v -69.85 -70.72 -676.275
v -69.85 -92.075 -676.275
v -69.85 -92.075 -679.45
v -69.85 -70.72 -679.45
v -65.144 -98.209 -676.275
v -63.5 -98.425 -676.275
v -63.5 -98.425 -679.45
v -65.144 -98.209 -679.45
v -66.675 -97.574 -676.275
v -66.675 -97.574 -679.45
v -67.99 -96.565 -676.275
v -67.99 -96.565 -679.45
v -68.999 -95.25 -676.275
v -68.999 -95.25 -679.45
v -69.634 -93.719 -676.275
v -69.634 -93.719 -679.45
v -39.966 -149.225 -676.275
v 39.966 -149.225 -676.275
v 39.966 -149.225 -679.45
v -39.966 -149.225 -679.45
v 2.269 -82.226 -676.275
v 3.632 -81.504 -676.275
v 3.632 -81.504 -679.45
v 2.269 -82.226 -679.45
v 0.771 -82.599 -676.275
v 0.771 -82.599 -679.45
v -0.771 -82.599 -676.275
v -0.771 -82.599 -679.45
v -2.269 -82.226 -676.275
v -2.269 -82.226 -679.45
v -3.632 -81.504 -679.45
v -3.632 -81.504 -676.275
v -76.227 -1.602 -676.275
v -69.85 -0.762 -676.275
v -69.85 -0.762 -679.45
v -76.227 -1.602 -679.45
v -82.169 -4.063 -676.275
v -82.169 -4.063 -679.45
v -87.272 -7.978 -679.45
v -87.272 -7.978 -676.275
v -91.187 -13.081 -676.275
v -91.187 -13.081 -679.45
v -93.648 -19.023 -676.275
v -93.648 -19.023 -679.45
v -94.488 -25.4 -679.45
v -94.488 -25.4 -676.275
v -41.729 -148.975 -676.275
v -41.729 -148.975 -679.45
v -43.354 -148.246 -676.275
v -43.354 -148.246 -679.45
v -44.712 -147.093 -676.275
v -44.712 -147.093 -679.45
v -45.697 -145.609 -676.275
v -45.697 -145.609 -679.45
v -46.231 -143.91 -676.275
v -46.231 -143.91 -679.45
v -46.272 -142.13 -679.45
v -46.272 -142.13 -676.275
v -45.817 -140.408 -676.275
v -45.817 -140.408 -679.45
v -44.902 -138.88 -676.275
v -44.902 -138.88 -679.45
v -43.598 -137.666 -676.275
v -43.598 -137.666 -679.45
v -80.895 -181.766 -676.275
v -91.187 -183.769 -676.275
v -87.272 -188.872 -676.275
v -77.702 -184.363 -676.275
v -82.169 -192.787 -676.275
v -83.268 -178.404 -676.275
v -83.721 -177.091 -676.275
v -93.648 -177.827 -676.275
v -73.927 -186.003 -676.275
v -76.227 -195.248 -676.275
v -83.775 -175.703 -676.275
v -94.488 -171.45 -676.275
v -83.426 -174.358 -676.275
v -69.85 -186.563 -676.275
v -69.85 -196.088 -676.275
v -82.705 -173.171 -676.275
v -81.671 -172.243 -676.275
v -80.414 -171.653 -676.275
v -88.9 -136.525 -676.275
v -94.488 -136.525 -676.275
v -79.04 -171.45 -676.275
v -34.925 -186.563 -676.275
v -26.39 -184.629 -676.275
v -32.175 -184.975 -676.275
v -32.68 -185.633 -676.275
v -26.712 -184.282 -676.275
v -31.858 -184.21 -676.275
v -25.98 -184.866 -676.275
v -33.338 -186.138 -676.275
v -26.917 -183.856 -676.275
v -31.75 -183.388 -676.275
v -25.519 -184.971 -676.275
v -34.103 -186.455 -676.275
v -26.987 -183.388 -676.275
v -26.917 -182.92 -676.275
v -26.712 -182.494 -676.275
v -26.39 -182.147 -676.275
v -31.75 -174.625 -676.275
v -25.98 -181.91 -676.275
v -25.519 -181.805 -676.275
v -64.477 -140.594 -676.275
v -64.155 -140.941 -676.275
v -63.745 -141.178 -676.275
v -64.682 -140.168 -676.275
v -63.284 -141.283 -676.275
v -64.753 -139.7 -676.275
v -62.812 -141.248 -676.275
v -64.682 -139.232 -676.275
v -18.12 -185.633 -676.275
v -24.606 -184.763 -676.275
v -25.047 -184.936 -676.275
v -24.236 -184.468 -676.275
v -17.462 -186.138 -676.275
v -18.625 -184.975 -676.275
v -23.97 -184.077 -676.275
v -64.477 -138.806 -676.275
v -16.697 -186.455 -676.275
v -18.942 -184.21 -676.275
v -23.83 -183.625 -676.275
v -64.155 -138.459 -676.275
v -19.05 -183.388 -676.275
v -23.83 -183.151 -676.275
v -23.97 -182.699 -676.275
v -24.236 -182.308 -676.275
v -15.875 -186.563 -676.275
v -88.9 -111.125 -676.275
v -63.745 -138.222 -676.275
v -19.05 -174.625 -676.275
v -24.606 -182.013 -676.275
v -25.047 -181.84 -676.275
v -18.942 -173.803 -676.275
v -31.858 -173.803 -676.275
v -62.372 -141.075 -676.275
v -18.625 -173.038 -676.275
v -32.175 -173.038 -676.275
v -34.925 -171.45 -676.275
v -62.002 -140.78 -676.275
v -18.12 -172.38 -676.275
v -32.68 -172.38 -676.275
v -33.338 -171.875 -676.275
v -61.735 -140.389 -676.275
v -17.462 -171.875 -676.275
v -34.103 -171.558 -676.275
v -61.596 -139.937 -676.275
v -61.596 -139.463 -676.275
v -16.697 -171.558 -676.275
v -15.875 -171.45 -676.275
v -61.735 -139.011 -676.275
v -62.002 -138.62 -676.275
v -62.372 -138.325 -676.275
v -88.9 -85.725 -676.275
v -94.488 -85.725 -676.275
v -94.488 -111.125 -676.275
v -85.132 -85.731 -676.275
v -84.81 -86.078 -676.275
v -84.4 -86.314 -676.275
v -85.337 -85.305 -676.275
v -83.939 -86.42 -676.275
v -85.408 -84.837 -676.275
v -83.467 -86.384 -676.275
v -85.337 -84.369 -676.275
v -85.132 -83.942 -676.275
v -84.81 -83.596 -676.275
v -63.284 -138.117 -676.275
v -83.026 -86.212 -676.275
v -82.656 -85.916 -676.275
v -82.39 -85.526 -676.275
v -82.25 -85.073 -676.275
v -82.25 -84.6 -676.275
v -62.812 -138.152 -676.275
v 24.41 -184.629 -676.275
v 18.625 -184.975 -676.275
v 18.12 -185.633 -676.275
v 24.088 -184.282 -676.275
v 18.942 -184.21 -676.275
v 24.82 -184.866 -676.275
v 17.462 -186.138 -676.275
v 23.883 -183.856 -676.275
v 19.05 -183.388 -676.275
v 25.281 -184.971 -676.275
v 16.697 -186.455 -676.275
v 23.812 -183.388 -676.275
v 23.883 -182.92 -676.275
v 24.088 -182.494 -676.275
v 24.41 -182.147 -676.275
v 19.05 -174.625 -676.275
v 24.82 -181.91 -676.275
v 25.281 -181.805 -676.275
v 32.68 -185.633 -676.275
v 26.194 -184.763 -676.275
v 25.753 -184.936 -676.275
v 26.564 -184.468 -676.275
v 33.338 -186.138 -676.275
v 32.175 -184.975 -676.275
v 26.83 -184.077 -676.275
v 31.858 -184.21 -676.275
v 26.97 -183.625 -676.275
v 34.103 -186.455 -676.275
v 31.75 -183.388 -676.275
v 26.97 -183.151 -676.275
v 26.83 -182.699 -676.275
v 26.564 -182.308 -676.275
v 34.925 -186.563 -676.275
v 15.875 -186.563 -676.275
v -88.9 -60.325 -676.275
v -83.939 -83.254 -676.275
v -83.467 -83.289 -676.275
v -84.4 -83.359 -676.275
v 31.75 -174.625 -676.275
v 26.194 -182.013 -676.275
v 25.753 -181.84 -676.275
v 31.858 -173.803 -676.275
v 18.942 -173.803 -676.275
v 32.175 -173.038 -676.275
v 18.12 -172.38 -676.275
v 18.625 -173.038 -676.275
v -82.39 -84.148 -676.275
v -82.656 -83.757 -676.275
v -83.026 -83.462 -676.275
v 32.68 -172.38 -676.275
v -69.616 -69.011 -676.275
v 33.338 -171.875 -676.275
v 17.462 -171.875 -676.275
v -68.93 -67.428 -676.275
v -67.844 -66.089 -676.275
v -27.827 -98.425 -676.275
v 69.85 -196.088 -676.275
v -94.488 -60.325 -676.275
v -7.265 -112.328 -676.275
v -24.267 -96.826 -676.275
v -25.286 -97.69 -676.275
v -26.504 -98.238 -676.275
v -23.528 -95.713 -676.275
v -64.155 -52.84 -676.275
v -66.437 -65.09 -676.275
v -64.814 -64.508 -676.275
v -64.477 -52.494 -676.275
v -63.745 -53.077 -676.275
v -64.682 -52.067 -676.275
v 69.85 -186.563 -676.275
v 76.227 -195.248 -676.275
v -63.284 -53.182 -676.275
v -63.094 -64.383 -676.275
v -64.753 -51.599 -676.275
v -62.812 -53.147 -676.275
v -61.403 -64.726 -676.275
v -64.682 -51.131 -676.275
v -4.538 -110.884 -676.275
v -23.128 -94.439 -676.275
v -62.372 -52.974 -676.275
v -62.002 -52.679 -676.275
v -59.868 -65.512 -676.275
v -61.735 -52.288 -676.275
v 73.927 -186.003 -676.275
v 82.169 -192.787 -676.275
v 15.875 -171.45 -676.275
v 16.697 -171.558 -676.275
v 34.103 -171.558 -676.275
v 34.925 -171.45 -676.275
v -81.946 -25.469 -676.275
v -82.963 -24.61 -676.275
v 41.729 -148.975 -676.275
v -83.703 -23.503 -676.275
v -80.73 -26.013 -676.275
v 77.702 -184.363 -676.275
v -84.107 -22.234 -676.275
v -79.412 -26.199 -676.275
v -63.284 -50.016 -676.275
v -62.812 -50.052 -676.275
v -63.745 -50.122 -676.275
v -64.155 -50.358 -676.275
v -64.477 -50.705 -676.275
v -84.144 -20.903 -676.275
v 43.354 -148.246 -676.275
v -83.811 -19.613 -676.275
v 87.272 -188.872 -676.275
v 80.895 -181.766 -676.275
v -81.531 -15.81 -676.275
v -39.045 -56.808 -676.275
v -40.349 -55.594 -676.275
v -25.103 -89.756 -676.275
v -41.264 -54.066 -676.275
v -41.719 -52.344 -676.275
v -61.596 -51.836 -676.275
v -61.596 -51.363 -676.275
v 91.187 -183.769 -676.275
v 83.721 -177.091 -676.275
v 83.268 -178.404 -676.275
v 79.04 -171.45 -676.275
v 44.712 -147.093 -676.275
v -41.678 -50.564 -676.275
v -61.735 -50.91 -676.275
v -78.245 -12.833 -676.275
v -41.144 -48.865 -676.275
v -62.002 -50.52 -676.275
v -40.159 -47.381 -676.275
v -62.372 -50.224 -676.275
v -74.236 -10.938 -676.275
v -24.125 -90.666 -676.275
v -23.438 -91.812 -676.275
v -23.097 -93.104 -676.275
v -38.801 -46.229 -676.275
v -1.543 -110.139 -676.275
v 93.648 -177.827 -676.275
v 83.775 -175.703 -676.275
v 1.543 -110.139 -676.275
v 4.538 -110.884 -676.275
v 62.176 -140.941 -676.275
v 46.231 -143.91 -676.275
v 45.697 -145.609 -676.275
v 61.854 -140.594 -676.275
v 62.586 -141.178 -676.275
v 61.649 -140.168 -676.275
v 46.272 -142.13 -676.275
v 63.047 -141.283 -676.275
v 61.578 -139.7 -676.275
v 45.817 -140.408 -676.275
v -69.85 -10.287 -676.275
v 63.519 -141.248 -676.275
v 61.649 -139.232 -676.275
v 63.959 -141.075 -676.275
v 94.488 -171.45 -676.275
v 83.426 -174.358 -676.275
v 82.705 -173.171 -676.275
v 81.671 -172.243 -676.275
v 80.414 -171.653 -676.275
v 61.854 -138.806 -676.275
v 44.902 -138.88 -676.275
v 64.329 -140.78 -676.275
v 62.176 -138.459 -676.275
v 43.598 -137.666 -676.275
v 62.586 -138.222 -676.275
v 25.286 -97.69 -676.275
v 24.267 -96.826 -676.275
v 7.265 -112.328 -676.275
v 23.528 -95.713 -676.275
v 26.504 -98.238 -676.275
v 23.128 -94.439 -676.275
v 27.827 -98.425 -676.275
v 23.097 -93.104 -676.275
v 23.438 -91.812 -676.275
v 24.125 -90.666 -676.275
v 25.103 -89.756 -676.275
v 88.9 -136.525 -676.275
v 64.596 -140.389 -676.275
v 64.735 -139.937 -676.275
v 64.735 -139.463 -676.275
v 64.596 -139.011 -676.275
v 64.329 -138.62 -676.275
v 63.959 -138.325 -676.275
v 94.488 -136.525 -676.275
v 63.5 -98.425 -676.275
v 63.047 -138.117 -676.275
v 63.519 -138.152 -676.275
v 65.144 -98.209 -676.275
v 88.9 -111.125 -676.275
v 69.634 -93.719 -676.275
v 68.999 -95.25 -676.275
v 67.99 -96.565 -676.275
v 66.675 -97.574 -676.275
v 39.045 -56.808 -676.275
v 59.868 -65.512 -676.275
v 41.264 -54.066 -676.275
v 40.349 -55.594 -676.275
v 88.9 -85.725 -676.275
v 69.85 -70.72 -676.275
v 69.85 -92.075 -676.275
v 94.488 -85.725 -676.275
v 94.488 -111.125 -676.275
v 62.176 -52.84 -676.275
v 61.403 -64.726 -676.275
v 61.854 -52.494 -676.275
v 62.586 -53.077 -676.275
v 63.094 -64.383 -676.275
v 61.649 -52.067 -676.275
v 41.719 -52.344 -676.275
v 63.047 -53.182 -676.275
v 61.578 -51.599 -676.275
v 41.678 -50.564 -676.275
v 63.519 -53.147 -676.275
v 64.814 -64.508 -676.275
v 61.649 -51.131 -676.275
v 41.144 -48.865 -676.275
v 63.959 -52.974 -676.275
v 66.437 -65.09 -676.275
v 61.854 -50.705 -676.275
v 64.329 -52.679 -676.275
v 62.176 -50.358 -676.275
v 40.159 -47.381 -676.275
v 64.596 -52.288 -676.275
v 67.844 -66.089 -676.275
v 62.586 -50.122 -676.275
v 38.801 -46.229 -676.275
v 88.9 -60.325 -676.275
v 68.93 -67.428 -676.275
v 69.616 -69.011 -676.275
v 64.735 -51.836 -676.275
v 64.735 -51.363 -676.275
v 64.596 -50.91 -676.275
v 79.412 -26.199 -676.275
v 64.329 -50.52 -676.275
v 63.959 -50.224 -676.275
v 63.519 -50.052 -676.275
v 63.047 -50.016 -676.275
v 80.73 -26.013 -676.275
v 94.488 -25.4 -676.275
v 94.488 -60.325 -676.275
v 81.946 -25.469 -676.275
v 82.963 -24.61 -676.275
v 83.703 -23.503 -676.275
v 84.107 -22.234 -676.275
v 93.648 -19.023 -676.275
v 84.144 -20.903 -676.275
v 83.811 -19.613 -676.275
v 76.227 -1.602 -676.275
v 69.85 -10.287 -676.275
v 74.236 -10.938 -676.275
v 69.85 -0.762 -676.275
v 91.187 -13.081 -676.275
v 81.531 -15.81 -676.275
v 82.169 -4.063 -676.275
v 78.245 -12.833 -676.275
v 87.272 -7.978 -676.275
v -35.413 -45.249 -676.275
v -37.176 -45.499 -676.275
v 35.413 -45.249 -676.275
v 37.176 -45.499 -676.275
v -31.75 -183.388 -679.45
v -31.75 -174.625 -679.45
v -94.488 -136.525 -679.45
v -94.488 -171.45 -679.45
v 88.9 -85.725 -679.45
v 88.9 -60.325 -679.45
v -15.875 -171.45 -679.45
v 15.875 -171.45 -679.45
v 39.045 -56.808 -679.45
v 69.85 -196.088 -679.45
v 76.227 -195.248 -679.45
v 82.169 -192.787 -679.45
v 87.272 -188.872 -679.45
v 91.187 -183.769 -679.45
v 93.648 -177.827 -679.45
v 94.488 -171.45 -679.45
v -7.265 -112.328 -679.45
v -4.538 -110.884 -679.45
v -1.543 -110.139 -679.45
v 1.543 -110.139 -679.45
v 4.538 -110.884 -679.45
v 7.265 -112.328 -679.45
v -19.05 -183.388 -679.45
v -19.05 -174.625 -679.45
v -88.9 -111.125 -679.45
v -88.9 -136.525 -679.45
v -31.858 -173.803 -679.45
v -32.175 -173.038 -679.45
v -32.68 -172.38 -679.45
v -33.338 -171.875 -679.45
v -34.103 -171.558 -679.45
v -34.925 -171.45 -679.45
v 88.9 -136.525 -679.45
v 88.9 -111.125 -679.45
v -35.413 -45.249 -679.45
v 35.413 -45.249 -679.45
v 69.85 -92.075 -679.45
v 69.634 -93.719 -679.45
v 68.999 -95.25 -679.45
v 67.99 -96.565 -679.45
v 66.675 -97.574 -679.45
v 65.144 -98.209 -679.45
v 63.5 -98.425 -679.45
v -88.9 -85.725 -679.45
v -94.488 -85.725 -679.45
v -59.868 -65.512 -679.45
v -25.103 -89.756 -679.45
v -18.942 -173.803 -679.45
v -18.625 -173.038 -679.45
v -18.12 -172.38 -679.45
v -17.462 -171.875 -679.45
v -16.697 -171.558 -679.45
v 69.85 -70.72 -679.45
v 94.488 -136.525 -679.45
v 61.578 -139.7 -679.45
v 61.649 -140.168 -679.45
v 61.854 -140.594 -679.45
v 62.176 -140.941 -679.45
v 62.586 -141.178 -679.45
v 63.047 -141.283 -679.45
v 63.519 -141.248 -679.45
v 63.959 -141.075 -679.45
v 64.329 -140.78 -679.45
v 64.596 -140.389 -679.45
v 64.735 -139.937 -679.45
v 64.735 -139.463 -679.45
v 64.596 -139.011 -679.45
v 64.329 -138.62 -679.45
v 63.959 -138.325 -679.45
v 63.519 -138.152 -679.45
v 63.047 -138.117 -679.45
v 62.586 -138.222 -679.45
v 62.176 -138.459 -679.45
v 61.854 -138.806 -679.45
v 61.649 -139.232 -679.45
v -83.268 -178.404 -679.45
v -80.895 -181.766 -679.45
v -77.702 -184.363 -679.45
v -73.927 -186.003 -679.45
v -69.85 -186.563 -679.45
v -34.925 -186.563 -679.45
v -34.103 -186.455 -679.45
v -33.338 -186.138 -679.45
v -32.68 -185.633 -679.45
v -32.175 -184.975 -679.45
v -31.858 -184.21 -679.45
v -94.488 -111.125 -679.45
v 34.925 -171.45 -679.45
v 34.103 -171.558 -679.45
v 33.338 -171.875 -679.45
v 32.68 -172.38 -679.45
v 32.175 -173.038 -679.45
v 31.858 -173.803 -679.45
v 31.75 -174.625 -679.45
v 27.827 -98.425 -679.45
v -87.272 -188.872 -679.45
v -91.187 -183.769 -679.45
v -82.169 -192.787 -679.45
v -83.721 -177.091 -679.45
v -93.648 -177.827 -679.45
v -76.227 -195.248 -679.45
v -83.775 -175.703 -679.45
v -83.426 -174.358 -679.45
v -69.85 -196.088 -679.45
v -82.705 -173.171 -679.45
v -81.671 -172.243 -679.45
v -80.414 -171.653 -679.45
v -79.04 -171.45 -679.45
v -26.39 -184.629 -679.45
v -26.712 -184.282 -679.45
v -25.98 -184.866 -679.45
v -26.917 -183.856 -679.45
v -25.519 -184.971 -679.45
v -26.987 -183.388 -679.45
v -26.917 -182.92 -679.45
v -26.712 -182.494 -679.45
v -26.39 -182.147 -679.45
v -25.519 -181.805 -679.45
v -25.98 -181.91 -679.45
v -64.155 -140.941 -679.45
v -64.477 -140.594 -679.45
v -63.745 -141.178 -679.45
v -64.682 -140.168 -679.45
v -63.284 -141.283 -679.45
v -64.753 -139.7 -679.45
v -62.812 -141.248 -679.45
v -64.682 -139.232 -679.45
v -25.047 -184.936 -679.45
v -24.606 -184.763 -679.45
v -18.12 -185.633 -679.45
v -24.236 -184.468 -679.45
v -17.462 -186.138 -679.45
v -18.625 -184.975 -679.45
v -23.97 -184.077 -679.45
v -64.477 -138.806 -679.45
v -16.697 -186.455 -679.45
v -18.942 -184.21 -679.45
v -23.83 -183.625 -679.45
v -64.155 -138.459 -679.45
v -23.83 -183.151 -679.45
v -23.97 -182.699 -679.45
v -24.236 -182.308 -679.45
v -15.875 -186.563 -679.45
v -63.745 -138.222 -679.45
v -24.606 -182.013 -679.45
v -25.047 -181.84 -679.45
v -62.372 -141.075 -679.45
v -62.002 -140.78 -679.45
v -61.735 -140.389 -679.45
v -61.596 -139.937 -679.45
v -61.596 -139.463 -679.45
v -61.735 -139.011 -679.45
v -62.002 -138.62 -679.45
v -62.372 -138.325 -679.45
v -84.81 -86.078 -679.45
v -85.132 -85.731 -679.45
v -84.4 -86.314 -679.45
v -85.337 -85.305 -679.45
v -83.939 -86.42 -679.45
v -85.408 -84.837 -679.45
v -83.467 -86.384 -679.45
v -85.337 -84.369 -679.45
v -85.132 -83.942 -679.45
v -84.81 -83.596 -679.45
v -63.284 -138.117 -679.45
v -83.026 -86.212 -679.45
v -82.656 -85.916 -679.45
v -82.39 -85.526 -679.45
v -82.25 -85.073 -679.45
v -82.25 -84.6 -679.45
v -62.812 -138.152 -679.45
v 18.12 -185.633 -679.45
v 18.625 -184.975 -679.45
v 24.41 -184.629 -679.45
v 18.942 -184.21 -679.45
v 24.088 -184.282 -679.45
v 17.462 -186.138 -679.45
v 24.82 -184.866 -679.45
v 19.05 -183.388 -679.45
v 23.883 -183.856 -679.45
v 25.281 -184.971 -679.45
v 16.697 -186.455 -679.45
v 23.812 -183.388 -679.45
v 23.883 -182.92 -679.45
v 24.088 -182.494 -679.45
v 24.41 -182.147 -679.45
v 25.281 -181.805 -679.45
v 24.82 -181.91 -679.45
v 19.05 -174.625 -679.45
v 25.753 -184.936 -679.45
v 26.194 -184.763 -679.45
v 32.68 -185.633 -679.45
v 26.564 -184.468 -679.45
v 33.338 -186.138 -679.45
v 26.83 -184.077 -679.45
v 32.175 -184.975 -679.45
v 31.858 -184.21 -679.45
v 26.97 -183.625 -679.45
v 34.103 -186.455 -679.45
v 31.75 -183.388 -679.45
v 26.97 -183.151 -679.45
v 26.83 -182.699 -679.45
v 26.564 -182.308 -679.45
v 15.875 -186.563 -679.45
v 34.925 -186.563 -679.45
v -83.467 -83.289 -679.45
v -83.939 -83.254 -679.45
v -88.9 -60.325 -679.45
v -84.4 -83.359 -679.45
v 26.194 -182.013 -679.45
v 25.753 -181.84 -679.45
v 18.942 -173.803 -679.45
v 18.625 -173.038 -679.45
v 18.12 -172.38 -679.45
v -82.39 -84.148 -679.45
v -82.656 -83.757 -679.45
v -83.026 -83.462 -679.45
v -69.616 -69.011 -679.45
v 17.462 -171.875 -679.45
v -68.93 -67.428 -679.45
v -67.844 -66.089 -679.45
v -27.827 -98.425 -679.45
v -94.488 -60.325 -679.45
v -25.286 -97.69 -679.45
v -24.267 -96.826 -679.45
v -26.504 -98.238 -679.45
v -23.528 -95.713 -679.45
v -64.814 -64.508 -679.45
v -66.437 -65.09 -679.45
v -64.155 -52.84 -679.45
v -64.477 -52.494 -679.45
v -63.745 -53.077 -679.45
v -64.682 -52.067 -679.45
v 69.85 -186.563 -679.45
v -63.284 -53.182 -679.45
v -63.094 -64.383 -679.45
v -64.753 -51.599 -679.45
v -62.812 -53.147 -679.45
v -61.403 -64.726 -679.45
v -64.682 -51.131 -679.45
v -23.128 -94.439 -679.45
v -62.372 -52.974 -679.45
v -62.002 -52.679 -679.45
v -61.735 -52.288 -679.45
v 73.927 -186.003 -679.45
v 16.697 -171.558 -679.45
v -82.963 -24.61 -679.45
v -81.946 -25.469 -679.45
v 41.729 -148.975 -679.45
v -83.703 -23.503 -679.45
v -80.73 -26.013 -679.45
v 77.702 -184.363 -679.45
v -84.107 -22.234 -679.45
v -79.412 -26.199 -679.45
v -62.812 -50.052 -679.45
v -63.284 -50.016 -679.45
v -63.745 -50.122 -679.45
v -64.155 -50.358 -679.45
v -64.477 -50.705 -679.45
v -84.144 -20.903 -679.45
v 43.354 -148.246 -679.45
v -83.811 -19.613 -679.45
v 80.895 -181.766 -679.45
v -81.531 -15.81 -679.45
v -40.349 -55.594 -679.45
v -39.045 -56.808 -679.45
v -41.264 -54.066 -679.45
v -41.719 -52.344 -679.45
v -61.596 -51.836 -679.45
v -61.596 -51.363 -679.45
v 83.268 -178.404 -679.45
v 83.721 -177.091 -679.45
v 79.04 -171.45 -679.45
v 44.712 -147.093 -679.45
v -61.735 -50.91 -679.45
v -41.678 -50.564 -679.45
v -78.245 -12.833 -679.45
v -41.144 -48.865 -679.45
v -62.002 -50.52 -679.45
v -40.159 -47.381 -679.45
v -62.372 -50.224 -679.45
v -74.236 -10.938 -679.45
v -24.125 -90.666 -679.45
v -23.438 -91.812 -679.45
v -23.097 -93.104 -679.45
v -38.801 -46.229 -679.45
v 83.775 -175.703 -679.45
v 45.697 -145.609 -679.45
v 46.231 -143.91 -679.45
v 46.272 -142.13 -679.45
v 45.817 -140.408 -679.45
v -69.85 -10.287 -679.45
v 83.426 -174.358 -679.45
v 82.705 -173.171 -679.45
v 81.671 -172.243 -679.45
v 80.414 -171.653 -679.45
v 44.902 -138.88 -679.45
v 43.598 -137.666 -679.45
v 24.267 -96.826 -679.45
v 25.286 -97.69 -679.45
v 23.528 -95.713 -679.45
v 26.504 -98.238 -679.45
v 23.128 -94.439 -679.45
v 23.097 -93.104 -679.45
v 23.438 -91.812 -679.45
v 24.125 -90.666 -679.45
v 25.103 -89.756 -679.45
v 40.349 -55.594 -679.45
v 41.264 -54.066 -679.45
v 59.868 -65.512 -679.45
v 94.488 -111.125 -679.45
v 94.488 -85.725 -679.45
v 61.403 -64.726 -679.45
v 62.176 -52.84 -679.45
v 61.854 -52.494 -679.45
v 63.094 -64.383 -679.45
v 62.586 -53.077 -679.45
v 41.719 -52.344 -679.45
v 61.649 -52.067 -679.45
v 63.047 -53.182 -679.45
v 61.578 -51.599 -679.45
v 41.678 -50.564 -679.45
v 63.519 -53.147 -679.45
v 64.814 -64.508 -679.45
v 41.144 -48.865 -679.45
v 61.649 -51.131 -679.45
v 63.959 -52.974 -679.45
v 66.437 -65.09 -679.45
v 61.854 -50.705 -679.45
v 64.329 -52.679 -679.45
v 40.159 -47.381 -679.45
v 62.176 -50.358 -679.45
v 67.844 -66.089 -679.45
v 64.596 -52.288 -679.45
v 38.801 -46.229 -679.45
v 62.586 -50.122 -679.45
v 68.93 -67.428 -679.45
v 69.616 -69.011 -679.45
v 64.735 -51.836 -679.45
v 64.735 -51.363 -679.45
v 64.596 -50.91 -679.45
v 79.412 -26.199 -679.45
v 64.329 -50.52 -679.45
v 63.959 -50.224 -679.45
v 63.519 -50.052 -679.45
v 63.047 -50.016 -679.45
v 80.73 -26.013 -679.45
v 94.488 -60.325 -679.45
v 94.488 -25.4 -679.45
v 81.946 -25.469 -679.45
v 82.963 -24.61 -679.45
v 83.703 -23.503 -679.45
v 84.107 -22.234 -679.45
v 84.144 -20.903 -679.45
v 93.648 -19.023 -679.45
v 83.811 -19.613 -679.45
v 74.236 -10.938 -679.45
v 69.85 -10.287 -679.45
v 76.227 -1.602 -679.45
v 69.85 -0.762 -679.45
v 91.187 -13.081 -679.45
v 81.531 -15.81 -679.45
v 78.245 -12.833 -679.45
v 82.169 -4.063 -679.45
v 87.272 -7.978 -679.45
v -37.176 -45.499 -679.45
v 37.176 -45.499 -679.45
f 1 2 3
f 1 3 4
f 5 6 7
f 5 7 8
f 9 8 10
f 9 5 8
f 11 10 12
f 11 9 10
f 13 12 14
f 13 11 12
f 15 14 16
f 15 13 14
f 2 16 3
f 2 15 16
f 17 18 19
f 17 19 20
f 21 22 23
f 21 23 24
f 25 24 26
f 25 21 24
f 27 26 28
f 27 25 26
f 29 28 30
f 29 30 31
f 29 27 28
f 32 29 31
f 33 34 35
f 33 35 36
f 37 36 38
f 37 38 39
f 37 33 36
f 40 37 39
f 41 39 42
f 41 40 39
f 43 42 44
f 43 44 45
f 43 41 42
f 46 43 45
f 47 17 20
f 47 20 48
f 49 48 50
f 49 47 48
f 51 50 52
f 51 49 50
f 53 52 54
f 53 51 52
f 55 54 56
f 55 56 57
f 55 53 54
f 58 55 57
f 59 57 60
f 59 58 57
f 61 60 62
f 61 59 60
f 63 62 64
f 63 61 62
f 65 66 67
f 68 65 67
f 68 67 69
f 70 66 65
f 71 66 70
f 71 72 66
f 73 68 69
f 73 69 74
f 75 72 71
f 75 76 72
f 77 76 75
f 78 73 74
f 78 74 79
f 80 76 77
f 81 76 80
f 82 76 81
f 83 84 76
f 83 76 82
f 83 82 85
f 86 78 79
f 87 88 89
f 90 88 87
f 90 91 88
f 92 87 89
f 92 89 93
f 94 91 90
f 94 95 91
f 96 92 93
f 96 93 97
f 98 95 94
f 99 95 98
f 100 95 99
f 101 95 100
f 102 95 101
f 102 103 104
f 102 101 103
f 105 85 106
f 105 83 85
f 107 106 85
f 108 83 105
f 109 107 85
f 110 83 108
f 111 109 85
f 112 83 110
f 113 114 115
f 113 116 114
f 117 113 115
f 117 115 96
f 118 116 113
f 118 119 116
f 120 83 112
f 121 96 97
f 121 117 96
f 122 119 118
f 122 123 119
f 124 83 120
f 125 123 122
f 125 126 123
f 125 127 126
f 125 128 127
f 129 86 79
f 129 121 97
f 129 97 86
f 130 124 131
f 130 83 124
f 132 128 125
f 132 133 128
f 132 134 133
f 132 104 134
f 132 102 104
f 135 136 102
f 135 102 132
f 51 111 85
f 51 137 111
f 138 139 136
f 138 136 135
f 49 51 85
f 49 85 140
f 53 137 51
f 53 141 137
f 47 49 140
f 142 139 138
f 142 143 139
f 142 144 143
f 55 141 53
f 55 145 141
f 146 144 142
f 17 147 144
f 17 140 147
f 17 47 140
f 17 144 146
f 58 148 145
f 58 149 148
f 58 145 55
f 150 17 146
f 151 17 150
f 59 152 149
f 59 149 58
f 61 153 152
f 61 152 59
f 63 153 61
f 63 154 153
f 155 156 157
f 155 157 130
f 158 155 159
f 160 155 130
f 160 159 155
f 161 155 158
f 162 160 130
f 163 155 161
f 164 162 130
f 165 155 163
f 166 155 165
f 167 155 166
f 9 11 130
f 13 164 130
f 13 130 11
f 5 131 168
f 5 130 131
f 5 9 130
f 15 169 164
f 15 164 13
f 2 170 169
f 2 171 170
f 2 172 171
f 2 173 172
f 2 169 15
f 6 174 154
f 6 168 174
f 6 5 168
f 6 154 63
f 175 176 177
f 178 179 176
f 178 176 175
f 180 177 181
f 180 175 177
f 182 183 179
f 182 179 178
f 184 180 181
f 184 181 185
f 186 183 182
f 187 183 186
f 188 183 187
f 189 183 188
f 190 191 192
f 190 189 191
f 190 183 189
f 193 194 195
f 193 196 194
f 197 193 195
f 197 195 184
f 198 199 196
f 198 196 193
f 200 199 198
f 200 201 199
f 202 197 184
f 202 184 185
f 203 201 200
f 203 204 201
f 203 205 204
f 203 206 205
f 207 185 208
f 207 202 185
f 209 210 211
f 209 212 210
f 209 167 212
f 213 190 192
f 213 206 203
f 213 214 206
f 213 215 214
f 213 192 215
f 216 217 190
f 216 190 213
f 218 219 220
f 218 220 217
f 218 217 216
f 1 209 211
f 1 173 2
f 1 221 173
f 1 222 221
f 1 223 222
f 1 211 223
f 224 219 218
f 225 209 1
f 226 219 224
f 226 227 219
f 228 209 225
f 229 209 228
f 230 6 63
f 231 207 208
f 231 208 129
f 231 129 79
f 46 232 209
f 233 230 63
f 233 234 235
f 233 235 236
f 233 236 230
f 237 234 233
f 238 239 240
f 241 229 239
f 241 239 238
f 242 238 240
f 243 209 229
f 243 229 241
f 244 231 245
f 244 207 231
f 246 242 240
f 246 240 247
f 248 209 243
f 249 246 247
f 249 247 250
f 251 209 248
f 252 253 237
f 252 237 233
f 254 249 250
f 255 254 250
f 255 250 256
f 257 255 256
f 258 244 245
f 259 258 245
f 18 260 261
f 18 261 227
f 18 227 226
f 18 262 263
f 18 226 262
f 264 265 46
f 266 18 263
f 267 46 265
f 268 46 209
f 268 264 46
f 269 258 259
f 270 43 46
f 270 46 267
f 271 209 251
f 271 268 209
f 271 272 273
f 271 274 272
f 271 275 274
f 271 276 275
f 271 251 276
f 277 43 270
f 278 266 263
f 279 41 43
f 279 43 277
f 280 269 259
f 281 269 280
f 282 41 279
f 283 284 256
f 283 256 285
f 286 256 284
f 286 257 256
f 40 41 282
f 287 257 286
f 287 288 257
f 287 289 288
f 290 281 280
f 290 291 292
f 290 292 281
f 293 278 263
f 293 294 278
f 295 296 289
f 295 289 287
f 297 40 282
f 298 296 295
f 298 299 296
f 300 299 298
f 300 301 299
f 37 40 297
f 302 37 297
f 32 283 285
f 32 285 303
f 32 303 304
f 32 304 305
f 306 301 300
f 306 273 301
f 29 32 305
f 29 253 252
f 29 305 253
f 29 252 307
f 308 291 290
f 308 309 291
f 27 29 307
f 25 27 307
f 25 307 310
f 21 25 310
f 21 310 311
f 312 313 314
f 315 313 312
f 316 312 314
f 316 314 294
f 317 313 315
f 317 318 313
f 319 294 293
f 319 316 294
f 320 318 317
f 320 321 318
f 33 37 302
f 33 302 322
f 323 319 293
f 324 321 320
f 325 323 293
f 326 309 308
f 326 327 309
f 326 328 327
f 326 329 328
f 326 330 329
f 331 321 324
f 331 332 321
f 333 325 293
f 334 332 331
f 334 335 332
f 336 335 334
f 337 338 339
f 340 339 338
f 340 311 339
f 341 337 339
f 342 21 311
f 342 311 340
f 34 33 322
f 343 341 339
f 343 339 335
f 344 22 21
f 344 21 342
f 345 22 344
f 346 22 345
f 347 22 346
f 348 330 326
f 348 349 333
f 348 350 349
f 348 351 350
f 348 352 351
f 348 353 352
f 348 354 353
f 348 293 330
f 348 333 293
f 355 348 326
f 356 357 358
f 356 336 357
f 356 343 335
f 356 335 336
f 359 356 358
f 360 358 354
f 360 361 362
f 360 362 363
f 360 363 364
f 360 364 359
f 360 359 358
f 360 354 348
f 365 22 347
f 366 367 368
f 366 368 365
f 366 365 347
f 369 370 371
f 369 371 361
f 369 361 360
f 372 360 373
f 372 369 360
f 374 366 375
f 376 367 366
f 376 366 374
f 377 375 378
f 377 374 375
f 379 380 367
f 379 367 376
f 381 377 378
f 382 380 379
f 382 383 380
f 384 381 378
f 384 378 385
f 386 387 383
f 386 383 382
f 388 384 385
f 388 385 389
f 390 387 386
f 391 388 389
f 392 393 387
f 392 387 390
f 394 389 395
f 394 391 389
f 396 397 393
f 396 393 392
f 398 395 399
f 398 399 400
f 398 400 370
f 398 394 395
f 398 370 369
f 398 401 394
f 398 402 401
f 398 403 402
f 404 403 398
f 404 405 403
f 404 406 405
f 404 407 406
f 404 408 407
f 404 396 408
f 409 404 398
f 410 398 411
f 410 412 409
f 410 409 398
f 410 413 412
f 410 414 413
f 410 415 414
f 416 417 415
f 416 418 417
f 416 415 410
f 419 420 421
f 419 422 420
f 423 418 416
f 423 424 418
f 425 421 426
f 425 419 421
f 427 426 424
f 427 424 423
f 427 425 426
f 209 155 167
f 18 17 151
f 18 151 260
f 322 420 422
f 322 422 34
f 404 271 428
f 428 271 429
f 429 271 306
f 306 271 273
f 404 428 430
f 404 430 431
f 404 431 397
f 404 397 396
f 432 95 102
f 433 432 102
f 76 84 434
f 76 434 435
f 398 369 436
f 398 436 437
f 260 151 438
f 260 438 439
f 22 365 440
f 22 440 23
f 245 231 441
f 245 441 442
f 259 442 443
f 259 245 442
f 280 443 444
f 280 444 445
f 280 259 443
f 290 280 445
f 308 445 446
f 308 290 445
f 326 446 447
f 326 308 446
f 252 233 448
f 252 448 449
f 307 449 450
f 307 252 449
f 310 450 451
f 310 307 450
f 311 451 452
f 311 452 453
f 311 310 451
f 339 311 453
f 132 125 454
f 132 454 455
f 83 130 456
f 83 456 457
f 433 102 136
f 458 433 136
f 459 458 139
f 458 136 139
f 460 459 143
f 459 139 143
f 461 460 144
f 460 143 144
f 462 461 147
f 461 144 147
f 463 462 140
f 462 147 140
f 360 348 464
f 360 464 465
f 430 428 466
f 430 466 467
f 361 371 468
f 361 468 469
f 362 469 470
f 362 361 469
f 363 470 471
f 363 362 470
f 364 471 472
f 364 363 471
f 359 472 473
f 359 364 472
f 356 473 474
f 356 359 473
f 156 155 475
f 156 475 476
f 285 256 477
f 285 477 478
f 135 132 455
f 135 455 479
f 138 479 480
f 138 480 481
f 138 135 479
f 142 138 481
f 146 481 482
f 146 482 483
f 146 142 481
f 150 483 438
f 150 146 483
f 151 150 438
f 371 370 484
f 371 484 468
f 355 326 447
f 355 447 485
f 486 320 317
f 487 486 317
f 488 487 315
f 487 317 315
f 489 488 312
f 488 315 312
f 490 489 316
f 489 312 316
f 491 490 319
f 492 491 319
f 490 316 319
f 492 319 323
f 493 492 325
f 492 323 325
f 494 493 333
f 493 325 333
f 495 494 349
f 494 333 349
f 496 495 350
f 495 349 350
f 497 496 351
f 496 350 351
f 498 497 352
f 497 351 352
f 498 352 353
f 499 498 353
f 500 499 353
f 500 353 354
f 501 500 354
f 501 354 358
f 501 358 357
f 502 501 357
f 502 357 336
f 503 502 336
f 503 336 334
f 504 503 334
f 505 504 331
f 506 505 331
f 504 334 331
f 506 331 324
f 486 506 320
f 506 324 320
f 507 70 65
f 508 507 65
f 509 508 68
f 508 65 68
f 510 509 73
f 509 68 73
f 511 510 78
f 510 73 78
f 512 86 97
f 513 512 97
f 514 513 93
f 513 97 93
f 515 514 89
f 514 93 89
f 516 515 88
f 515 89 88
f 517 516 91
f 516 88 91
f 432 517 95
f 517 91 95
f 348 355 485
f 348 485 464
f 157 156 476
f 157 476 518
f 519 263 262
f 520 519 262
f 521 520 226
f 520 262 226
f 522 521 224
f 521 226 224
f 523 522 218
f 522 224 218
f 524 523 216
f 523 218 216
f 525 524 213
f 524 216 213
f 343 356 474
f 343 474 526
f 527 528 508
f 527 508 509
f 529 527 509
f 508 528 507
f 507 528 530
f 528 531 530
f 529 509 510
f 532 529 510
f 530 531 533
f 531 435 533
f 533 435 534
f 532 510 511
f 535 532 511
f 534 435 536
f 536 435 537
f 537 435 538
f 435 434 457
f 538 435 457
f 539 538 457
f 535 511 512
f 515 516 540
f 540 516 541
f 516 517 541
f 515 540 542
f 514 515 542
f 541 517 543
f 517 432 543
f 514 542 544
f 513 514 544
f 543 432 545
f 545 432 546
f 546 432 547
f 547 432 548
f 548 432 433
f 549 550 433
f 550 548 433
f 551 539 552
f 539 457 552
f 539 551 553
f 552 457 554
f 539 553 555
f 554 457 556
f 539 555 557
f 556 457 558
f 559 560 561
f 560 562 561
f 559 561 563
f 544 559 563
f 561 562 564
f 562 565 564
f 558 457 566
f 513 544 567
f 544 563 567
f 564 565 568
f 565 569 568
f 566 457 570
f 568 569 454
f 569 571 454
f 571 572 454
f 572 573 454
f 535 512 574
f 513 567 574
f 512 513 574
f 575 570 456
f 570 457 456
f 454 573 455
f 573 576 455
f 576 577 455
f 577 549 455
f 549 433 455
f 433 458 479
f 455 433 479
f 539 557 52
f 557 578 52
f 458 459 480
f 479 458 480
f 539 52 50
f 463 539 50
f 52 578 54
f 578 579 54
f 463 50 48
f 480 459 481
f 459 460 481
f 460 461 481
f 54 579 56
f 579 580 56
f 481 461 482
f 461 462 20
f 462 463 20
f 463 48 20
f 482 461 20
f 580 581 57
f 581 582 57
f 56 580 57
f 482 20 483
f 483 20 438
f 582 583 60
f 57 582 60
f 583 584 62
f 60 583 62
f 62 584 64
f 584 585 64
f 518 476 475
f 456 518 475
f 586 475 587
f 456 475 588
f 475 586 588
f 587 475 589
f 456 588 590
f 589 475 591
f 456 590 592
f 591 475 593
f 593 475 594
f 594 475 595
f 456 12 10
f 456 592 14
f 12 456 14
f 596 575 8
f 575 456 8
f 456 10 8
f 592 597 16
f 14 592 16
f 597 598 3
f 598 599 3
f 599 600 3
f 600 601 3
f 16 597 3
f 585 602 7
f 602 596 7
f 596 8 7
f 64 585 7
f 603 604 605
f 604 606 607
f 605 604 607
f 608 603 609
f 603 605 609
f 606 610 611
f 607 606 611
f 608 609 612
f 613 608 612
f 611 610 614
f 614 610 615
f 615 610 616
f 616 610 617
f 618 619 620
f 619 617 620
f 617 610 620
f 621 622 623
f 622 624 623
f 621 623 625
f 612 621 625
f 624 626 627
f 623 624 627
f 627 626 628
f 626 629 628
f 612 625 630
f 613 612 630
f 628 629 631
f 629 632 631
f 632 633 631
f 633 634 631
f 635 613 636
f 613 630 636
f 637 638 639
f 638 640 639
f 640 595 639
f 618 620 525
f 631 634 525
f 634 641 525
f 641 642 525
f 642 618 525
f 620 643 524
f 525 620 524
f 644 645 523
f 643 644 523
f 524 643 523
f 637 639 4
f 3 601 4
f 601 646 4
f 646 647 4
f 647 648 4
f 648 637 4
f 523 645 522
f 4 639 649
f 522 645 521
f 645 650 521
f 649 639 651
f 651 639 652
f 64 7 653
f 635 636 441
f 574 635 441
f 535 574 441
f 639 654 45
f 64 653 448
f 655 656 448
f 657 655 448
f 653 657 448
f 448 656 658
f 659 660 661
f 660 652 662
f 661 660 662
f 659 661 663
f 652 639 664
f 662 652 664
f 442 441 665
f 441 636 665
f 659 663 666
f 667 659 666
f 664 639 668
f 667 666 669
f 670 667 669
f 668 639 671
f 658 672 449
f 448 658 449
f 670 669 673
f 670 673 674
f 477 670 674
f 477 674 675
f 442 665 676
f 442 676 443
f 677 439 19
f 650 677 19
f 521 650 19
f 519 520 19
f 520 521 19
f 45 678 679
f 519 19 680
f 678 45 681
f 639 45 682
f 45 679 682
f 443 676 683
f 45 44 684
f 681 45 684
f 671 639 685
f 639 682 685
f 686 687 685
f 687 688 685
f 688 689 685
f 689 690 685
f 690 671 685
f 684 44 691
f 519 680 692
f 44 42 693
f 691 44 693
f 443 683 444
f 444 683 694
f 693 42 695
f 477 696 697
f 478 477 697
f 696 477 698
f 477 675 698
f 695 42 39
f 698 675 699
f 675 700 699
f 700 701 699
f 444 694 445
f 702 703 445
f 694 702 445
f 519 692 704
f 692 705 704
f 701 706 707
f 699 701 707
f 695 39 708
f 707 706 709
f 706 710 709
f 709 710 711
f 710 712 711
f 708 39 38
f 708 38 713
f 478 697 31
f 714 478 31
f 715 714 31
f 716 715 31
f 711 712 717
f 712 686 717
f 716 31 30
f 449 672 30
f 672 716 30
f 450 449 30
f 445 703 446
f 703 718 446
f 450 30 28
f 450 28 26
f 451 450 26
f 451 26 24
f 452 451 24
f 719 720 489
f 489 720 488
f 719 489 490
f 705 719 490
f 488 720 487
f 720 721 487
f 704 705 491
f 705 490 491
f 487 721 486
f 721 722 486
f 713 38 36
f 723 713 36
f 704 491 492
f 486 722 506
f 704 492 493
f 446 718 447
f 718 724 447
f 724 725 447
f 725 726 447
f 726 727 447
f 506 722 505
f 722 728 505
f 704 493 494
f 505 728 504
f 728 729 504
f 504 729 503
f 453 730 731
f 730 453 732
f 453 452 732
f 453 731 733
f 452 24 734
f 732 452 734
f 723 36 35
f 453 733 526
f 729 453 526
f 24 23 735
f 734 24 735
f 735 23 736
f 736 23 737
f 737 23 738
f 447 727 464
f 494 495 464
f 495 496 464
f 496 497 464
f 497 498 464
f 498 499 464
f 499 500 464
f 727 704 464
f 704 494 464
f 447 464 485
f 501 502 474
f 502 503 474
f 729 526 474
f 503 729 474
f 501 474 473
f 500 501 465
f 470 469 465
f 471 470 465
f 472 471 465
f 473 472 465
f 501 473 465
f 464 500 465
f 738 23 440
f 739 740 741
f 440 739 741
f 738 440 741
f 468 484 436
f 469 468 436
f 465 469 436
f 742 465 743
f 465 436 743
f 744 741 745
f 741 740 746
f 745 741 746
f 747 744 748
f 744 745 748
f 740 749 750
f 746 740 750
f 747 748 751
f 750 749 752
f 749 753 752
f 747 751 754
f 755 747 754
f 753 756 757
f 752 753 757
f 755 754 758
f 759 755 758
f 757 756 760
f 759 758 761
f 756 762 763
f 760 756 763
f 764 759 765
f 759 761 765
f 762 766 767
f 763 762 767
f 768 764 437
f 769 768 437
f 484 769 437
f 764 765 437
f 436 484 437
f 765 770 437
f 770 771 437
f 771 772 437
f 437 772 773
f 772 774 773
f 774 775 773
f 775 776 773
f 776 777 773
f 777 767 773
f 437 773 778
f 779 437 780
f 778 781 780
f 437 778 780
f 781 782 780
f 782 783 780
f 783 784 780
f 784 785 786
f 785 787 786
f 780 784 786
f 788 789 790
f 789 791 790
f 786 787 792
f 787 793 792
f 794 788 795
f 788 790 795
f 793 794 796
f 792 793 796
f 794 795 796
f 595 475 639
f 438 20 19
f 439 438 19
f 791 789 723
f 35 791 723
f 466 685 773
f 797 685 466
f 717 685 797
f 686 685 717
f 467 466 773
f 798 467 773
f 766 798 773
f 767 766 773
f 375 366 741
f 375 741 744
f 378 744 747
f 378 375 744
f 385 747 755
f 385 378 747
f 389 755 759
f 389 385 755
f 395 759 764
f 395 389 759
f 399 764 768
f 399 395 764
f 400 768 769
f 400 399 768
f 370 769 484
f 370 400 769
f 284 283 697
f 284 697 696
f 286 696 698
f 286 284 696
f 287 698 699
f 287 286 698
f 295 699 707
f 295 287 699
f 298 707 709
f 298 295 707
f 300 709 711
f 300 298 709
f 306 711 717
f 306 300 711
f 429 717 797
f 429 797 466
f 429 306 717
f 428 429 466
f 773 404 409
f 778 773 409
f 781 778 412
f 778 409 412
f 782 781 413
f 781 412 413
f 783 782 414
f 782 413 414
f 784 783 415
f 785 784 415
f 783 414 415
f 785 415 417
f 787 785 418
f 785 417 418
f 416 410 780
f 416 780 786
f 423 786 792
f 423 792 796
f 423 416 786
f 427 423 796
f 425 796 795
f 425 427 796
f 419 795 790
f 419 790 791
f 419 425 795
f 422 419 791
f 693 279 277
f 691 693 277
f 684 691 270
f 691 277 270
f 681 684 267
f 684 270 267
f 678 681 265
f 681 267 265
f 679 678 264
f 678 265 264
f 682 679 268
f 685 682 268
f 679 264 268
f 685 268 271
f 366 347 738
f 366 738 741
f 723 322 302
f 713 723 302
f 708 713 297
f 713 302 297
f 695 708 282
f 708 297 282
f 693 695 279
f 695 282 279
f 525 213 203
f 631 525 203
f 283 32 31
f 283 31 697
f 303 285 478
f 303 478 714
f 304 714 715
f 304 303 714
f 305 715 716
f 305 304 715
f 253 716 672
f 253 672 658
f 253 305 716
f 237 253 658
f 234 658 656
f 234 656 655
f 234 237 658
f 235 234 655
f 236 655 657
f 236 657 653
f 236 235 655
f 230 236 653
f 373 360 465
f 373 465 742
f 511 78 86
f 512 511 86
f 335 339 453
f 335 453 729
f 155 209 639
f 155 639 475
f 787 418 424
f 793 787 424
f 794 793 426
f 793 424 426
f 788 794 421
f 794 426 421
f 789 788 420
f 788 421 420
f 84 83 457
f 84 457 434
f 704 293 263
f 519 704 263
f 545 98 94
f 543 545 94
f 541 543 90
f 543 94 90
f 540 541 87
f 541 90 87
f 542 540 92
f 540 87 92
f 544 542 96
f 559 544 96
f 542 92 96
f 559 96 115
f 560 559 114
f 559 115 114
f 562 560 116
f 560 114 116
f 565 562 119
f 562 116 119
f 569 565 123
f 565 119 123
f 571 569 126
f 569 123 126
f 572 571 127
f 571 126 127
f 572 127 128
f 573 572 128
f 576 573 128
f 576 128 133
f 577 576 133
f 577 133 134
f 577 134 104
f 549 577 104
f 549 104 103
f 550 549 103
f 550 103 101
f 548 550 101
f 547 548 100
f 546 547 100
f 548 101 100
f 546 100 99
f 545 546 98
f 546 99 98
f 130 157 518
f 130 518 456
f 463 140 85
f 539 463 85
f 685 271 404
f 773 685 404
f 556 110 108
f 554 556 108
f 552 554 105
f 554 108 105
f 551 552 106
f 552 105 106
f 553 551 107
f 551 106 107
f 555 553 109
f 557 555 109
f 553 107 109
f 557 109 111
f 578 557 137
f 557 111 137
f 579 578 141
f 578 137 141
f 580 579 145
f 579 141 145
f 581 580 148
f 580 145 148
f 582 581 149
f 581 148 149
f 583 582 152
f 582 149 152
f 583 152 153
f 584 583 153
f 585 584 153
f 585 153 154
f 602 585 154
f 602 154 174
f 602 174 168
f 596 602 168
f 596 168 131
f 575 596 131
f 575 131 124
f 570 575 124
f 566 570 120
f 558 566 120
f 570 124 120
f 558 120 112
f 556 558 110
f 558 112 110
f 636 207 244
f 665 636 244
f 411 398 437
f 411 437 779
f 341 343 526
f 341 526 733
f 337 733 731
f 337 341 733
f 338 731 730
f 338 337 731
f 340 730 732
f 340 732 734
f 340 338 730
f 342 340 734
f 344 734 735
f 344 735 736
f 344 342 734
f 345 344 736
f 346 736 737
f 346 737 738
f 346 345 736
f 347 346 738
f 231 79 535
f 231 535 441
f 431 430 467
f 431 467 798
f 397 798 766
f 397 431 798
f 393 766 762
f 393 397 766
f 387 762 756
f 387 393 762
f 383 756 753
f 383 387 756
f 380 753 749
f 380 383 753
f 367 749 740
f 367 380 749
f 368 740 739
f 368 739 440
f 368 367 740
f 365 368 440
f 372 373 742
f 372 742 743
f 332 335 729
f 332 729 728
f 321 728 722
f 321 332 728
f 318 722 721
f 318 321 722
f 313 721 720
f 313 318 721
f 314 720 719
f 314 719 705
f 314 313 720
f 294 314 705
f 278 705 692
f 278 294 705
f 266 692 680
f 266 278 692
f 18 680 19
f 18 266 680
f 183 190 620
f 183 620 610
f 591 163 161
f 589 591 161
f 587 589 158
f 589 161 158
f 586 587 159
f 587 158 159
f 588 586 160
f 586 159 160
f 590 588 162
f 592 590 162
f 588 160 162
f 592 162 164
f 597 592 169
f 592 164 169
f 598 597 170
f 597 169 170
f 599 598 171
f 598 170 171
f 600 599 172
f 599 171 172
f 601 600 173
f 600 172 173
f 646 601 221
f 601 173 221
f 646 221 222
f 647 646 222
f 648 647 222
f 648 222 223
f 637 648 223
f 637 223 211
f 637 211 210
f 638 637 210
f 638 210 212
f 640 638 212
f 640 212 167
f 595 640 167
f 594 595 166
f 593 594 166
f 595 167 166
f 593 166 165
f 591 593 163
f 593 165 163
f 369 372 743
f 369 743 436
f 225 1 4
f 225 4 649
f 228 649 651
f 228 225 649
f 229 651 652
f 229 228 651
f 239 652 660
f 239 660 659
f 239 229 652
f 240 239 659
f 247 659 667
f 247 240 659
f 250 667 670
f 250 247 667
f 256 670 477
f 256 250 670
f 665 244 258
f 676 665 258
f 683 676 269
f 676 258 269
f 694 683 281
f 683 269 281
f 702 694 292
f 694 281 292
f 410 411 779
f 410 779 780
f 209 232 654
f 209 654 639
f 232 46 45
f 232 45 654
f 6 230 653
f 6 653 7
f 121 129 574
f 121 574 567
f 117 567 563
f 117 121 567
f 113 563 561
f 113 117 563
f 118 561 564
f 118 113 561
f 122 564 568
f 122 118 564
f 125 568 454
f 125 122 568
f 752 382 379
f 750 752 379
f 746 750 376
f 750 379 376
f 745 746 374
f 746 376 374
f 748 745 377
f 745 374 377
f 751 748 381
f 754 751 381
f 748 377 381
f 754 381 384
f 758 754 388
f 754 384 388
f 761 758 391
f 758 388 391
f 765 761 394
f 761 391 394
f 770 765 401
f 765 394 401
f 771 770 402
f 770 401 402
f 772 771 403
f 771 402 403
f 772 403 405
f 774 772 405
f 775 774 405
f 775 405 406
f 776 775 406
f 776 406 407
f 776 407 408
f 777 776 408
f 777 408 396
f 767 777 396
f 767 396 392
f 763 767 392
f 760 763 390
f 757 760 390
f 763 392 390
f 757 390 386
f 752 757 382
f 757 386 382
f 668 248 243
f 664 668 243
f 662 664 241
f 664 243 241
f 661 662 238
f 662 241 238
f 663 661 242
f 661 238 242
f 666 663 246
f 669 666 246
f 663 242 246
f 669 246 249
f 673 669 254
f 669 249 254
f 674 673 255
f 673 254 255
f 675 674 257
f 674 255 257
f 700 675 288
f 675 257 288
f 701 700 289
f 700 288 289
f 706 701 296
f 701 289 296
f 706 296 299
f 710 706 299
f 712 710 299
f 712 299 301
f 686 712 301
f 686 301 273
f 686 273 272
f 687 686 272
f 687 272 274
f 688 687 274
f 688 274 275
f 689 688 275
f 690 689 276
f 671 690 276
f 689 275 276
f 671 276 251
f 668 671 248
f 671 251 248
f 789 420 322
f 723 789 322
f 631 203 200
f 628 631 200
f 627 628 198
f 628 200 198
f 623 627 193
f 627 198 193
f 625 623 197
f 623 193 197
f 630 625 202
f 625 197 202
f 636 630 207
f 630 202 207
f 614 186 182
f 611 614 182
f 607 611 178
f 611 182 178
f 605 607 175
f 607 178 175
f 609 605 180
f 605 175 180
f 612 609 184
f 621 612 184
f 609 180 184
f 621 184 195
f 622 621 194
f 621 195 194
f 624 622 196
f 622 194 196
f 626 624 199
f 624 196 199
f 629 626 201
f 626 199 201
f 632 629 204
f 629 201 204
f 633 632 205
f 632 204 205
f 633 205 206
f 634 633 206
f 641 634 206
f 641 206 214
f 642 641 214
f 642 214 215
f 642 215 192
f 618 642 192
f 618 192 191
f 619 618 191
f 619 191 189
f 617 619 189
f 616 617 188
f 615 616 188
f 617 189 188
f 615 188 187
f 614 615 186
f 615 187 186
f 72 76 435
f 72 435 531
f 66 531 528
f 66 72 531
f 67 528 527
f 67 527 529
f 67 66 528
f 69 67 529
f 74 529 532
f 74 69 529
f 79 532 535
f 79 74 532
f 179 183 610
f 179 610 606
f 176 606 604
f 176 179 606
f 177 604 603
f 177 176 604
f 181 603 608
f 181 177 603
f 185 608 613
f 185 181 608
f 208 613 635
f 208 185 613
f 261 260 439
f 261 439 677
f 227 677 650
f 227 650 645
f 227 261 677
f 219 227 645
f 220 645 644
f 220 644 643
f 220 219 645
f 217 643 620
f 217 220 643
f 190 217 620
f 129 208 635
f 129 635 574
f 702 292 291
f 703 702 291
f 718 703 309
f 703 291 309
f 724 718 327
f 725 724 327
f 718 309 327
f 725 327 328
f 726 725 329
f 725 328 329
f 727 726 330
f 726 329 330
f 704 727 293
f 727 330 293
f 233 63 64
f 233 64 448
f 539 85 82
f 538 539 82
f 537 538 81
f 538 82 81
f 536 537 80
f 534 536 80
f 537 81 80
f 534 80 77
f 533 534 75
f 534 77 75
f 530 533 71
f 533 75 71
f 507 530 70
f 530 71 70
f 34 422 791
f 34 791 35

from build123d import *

# Parameters (mm, degrees)
SKETCH1_R           = 1.5875
BOSS_EXTRUDE1_DEPTH = 3.175


with BuildPart() as part:
    # Sketch1 → Boss-Extrude1 (new body)
    with BuildSketch(Plane.XY.offset(-676.275)):
        with BuildLine():
            Line((94.488, -171.45), (94.488, -136.525))
            Line((94.488, -136.525), (88.9, -136.525))
            Line((88.9, -136.525), (88.9, -111.125))
            Line((88.9, -111.125), (94.488, -111.125))
            Line((94.488, -111.125), (94.488, -85.725))
            Line((94.488, -85.725), (88.9, -85.725))
            Line((88.9, -85.725), (88.9, -60.325))
            Line((88.9, -60.325), (94.488, -60.325))
            Line((94.488, -60.325), (94.488, -25.4))
            ThreePointArc((94.488, -25.4), (87.271696875, -7.978303125), (69.85, -0.762))
            Line((69.85, -0.762), (-69.85, -0.762))
            ThreePointArc((-69.85, -0.762), (-87.271696875, -7.978303125), (-94.488, -25.4))
            Line((-94.488, -25.4), (-94.488, -60.325))
            Line((-94.488, -60.325), (-88.9, -60.325))
            Line((-88.9, -60.325), (-88.9, -85.725))
            Line((-88.9, -85.725), (-94.488, -85.725))
            Line((-94.488, -85.725), (-94.488, -111.125))
            Line((-94.488, -111.125), (-88.9, -111.125))
            Line((-88.9, -111.125), (-88.9, -136.525))
            Line((-88.9, -136.525), (-94.488, -136.525))
            Line((-94.488, -136.525), (-94.488, -171.45))
            ThreePointArc((-94.488, -171.45), (-87.271696875, -188.871696875), (-69.85, -196.088))
            Line((-69.85, -196.088), (69.85, -196.088))
            ThreePointArc((69.85, -196.088), (87.271696875, -188.871696875), (94.488, -171.45))
        make_face()
        with Locations(Location((63.1655201, -139.7, 0), (0, 0, 180))):
            Circle(SKETCH1_R, mode=Mode.SUBTRACT)
        with Locations(Location((-83.82, -84.836714101, 0), (0, 0, 180))):
            Circle(SKETCH1_R, mode=Mode.SUBTRACT)
        with Locations(Location((-63.1655201, -51.5992872, 0), (0, 0, 180))):
            Circle(SKETCH1_R, mode=Mode.SUBTRACT)
        with Locations(Location((25.4, -183.388, 0), (0, 0, 180))):
            Circle(SKETCH1_R, mode=Mode.SUBTRACT)
        with Locations(Location((-25.4, -183.388, 0), (0, 0, 180))):
            Circle(SKETCH1_R, mode=Mode.SUBTRACT)
        with Locations(Location((-63.1655201, -139.7, 0), (0, 0, 180))):
            Circle(SKETCH1_R, mode=Mode.SUBTRACT)
        with Locations(Location((63.1655201, -51.5992872, 0), (0, 0, 180))):
            Circle(SKETCH1_R, mode=Mode.SUBTRACT)
        with BuildLine():
            Line((7.264641701, -112.328307791), (43.598023874, -137.666473794))
            ThreePointArc((43.598023874, -137.666473794), (46.023616914, -144.778727737), (39.965703023, -149.225))
            Line((39.965703023, -149.225), (-39.965703023, -149.225))
            ThreePointArc((-39.965703023, -149.225), (-46.023616914, -144.778727737), (-43.598023874, -137.666473794))
            Line((-43.598023874, -137.666473794), (-7.264641701, -112.328307791))
            ThreePointArc((-7.264641701, -112.328307791), (0, -110.045360203), (7.264641701, -112.328307791))
        make_face(mode=Mode.SUBTRACT)
        with BuildLine():
            Line((39.04526783, -56.807813406), (3.632320851, -81.504086518))
            ThreePointArc((3.632320851, -81.504086518), (0, -82.645560312), (-3.632320851, -81.504086518))
            Line((-3.632320851, -81.504086518), (-39.04526783, -56.807813406))
            ThreePointArc((-39.04526783, -56.807813406), (-41.47086087, -49.695559463), (-35.41294698, -45.2492872))
            Line((-35.41294698, -45.2492872), (35.41294698, -45.2492872))
            ThreePointArc((35.41294698, -45.2492872), (41.47086087, -49.695559463), (39.04526783, -56.807813406))
        make_face(mode=Mode.SUBTRACT)
        with BuildLine():
            Line((69.85, -70.72011097), (69.85, -92.075))
            ThreePointArc((69.85, -92.075), (67.990128061, -96.565128061), (63.5, -98.425))
            Line((63.5, -98.425), (27.826758339, -98.425))
            ThreePointArc((27.826758339, -98.425), (23.283322921, -95.090295803), (25.102517701, -89.756105345))
            Line((25.102517701, -89.756105345), (59.867679149, -65.511584764))
            ThreePointArc((59.867679149, -65.511584764), (66.4374532, -65.090380186), (69.85, -70.72011097))
        make_face(mode=Mode.SUBTRACT)
        with BuildLine():
            Line((-59.867679149, -65.511584764), (-25.102517701, -89.756105345))
            ThreePointArc((-25.102517701, -89.756105345), (-23.283322921, -95.090295803), (-27.826758339, -98.425))
            Line((-27.826758339, -98.425), (-63.5, -98.425))
            ThreePointArc((-63.5, -98.425), (-67.990128061, -96.565128061), (-69.85, -92.075))
            Line((-69.85, -92.075), (-69.85, -70.72011097))
            ThreePointArc((-69.85, -70.72011097), (-66.4374532, -65.090380186), (-59.867679149, -65.511584764))
        make_face(mode=Mode.SUBTRACT)
        with BuildLine():
            Line((-69.85, -186.563), (-34.925, -186.563))
            ThreePointArc((-34.925, -186.563), (-32.67993597, -185.63306403), (-31.75, -183.388))
            Line((-31.75, -183.388), (-31.75, -174.625))
            ThreePointArc((-31.75, -174.625), (-32.67993597, -172.37993597), (-34.925, -171.45))
            Line((-34.925, -171.45), (-79.039746678, -171.45))
            ThreePointArc((-79.039746678, -171.45), (-83.108999442, -173.738113573), (-83.268157726, -178.403834356))
            ThreePointArc((-83.268157726, -178.403834356), (-77.702052928, -184.363095439), (-69.85, -186.563))
        make_face(mode=Mode.SUBTRACT)
        with BuildLine():
            Line((69.85, -10.287), (-69.85, -10.287))
            ThreePointArc((-69.85, -10.287), (-78.244855824, -12.833012903), (-83.811231367, -19.613223028))
            ThreePointArc((-83.811231367, -19.613223028), (-83.371868677, -24.08222496), (-79.411683667, -26.1992872))
            Line((-79.411683667, -26.1992872), (79.411683667, -26.1992872))
            ThreePointArc((79.411683667, -26.1992872), (83.371868677, -24.08222496), (83.811231367, -19.613223028))
            ThreePointArc((83.811231367, -19.613223028), (78.244855824, -12.833012903), (69.85, -10.287))
        make_face(mode=Mode.SUBTRACT)
        with BuildLine():
            Line((-19.05, -183.388), (-19.05, -174.625))
            ThreePointArc((-19.05, -174.625), (-18.12006403, -172.37993597), (-15.875, -171.45))
            Line((-15.875, -171.45), (15.875, -171.45))
            ThreePointArc((15.875, -171.45), (18.12006403, -172.37993597), (19.05, -174.625))
            Line((19.05, -174.625), (19.05, -183.388))
            ThreePointArc((19.05, -183.388), (18.12006403, -185.63306403), (15.875, -186.563))
            Line((15.875, -186.563), (-15.875, -186.563))
            ThreePointArc((-15.875, -186.563), (-18.12006403, -185.63306403), (-19.05, -183.388))
        make_face(mode=Mode.SUBTRACT)
        with BuildLine():
            Line((31.75, -174.625), (31.75, -183.388))
            ThreePointArc((31.75, -183.388), (32.67993597, -185.63306403), (34.925, -186.563))
            Line((34.925, -186.563), (69.85, -186.563))
            ThreePointArc((69.85, -186.563), (77.702052928, -184.363095439), (83.268157726, -178.403834356))
            ThreePointArc((83.268157726, -178.403834356), (83.108999442, -173.738113573), (79.039746678, -171.45))
            Line((79.039746678, -171.45), (34.925, -171.45))
            ThreePointArc((34.925, -171.45), (32.67993597, -172.37993597), (31.75, -174.625))
        make_face(mode=Mode.SUBTRACT)
    extrude(amount=-BOSS_EXTRUDE1_DEPTH)


solid = part.part
